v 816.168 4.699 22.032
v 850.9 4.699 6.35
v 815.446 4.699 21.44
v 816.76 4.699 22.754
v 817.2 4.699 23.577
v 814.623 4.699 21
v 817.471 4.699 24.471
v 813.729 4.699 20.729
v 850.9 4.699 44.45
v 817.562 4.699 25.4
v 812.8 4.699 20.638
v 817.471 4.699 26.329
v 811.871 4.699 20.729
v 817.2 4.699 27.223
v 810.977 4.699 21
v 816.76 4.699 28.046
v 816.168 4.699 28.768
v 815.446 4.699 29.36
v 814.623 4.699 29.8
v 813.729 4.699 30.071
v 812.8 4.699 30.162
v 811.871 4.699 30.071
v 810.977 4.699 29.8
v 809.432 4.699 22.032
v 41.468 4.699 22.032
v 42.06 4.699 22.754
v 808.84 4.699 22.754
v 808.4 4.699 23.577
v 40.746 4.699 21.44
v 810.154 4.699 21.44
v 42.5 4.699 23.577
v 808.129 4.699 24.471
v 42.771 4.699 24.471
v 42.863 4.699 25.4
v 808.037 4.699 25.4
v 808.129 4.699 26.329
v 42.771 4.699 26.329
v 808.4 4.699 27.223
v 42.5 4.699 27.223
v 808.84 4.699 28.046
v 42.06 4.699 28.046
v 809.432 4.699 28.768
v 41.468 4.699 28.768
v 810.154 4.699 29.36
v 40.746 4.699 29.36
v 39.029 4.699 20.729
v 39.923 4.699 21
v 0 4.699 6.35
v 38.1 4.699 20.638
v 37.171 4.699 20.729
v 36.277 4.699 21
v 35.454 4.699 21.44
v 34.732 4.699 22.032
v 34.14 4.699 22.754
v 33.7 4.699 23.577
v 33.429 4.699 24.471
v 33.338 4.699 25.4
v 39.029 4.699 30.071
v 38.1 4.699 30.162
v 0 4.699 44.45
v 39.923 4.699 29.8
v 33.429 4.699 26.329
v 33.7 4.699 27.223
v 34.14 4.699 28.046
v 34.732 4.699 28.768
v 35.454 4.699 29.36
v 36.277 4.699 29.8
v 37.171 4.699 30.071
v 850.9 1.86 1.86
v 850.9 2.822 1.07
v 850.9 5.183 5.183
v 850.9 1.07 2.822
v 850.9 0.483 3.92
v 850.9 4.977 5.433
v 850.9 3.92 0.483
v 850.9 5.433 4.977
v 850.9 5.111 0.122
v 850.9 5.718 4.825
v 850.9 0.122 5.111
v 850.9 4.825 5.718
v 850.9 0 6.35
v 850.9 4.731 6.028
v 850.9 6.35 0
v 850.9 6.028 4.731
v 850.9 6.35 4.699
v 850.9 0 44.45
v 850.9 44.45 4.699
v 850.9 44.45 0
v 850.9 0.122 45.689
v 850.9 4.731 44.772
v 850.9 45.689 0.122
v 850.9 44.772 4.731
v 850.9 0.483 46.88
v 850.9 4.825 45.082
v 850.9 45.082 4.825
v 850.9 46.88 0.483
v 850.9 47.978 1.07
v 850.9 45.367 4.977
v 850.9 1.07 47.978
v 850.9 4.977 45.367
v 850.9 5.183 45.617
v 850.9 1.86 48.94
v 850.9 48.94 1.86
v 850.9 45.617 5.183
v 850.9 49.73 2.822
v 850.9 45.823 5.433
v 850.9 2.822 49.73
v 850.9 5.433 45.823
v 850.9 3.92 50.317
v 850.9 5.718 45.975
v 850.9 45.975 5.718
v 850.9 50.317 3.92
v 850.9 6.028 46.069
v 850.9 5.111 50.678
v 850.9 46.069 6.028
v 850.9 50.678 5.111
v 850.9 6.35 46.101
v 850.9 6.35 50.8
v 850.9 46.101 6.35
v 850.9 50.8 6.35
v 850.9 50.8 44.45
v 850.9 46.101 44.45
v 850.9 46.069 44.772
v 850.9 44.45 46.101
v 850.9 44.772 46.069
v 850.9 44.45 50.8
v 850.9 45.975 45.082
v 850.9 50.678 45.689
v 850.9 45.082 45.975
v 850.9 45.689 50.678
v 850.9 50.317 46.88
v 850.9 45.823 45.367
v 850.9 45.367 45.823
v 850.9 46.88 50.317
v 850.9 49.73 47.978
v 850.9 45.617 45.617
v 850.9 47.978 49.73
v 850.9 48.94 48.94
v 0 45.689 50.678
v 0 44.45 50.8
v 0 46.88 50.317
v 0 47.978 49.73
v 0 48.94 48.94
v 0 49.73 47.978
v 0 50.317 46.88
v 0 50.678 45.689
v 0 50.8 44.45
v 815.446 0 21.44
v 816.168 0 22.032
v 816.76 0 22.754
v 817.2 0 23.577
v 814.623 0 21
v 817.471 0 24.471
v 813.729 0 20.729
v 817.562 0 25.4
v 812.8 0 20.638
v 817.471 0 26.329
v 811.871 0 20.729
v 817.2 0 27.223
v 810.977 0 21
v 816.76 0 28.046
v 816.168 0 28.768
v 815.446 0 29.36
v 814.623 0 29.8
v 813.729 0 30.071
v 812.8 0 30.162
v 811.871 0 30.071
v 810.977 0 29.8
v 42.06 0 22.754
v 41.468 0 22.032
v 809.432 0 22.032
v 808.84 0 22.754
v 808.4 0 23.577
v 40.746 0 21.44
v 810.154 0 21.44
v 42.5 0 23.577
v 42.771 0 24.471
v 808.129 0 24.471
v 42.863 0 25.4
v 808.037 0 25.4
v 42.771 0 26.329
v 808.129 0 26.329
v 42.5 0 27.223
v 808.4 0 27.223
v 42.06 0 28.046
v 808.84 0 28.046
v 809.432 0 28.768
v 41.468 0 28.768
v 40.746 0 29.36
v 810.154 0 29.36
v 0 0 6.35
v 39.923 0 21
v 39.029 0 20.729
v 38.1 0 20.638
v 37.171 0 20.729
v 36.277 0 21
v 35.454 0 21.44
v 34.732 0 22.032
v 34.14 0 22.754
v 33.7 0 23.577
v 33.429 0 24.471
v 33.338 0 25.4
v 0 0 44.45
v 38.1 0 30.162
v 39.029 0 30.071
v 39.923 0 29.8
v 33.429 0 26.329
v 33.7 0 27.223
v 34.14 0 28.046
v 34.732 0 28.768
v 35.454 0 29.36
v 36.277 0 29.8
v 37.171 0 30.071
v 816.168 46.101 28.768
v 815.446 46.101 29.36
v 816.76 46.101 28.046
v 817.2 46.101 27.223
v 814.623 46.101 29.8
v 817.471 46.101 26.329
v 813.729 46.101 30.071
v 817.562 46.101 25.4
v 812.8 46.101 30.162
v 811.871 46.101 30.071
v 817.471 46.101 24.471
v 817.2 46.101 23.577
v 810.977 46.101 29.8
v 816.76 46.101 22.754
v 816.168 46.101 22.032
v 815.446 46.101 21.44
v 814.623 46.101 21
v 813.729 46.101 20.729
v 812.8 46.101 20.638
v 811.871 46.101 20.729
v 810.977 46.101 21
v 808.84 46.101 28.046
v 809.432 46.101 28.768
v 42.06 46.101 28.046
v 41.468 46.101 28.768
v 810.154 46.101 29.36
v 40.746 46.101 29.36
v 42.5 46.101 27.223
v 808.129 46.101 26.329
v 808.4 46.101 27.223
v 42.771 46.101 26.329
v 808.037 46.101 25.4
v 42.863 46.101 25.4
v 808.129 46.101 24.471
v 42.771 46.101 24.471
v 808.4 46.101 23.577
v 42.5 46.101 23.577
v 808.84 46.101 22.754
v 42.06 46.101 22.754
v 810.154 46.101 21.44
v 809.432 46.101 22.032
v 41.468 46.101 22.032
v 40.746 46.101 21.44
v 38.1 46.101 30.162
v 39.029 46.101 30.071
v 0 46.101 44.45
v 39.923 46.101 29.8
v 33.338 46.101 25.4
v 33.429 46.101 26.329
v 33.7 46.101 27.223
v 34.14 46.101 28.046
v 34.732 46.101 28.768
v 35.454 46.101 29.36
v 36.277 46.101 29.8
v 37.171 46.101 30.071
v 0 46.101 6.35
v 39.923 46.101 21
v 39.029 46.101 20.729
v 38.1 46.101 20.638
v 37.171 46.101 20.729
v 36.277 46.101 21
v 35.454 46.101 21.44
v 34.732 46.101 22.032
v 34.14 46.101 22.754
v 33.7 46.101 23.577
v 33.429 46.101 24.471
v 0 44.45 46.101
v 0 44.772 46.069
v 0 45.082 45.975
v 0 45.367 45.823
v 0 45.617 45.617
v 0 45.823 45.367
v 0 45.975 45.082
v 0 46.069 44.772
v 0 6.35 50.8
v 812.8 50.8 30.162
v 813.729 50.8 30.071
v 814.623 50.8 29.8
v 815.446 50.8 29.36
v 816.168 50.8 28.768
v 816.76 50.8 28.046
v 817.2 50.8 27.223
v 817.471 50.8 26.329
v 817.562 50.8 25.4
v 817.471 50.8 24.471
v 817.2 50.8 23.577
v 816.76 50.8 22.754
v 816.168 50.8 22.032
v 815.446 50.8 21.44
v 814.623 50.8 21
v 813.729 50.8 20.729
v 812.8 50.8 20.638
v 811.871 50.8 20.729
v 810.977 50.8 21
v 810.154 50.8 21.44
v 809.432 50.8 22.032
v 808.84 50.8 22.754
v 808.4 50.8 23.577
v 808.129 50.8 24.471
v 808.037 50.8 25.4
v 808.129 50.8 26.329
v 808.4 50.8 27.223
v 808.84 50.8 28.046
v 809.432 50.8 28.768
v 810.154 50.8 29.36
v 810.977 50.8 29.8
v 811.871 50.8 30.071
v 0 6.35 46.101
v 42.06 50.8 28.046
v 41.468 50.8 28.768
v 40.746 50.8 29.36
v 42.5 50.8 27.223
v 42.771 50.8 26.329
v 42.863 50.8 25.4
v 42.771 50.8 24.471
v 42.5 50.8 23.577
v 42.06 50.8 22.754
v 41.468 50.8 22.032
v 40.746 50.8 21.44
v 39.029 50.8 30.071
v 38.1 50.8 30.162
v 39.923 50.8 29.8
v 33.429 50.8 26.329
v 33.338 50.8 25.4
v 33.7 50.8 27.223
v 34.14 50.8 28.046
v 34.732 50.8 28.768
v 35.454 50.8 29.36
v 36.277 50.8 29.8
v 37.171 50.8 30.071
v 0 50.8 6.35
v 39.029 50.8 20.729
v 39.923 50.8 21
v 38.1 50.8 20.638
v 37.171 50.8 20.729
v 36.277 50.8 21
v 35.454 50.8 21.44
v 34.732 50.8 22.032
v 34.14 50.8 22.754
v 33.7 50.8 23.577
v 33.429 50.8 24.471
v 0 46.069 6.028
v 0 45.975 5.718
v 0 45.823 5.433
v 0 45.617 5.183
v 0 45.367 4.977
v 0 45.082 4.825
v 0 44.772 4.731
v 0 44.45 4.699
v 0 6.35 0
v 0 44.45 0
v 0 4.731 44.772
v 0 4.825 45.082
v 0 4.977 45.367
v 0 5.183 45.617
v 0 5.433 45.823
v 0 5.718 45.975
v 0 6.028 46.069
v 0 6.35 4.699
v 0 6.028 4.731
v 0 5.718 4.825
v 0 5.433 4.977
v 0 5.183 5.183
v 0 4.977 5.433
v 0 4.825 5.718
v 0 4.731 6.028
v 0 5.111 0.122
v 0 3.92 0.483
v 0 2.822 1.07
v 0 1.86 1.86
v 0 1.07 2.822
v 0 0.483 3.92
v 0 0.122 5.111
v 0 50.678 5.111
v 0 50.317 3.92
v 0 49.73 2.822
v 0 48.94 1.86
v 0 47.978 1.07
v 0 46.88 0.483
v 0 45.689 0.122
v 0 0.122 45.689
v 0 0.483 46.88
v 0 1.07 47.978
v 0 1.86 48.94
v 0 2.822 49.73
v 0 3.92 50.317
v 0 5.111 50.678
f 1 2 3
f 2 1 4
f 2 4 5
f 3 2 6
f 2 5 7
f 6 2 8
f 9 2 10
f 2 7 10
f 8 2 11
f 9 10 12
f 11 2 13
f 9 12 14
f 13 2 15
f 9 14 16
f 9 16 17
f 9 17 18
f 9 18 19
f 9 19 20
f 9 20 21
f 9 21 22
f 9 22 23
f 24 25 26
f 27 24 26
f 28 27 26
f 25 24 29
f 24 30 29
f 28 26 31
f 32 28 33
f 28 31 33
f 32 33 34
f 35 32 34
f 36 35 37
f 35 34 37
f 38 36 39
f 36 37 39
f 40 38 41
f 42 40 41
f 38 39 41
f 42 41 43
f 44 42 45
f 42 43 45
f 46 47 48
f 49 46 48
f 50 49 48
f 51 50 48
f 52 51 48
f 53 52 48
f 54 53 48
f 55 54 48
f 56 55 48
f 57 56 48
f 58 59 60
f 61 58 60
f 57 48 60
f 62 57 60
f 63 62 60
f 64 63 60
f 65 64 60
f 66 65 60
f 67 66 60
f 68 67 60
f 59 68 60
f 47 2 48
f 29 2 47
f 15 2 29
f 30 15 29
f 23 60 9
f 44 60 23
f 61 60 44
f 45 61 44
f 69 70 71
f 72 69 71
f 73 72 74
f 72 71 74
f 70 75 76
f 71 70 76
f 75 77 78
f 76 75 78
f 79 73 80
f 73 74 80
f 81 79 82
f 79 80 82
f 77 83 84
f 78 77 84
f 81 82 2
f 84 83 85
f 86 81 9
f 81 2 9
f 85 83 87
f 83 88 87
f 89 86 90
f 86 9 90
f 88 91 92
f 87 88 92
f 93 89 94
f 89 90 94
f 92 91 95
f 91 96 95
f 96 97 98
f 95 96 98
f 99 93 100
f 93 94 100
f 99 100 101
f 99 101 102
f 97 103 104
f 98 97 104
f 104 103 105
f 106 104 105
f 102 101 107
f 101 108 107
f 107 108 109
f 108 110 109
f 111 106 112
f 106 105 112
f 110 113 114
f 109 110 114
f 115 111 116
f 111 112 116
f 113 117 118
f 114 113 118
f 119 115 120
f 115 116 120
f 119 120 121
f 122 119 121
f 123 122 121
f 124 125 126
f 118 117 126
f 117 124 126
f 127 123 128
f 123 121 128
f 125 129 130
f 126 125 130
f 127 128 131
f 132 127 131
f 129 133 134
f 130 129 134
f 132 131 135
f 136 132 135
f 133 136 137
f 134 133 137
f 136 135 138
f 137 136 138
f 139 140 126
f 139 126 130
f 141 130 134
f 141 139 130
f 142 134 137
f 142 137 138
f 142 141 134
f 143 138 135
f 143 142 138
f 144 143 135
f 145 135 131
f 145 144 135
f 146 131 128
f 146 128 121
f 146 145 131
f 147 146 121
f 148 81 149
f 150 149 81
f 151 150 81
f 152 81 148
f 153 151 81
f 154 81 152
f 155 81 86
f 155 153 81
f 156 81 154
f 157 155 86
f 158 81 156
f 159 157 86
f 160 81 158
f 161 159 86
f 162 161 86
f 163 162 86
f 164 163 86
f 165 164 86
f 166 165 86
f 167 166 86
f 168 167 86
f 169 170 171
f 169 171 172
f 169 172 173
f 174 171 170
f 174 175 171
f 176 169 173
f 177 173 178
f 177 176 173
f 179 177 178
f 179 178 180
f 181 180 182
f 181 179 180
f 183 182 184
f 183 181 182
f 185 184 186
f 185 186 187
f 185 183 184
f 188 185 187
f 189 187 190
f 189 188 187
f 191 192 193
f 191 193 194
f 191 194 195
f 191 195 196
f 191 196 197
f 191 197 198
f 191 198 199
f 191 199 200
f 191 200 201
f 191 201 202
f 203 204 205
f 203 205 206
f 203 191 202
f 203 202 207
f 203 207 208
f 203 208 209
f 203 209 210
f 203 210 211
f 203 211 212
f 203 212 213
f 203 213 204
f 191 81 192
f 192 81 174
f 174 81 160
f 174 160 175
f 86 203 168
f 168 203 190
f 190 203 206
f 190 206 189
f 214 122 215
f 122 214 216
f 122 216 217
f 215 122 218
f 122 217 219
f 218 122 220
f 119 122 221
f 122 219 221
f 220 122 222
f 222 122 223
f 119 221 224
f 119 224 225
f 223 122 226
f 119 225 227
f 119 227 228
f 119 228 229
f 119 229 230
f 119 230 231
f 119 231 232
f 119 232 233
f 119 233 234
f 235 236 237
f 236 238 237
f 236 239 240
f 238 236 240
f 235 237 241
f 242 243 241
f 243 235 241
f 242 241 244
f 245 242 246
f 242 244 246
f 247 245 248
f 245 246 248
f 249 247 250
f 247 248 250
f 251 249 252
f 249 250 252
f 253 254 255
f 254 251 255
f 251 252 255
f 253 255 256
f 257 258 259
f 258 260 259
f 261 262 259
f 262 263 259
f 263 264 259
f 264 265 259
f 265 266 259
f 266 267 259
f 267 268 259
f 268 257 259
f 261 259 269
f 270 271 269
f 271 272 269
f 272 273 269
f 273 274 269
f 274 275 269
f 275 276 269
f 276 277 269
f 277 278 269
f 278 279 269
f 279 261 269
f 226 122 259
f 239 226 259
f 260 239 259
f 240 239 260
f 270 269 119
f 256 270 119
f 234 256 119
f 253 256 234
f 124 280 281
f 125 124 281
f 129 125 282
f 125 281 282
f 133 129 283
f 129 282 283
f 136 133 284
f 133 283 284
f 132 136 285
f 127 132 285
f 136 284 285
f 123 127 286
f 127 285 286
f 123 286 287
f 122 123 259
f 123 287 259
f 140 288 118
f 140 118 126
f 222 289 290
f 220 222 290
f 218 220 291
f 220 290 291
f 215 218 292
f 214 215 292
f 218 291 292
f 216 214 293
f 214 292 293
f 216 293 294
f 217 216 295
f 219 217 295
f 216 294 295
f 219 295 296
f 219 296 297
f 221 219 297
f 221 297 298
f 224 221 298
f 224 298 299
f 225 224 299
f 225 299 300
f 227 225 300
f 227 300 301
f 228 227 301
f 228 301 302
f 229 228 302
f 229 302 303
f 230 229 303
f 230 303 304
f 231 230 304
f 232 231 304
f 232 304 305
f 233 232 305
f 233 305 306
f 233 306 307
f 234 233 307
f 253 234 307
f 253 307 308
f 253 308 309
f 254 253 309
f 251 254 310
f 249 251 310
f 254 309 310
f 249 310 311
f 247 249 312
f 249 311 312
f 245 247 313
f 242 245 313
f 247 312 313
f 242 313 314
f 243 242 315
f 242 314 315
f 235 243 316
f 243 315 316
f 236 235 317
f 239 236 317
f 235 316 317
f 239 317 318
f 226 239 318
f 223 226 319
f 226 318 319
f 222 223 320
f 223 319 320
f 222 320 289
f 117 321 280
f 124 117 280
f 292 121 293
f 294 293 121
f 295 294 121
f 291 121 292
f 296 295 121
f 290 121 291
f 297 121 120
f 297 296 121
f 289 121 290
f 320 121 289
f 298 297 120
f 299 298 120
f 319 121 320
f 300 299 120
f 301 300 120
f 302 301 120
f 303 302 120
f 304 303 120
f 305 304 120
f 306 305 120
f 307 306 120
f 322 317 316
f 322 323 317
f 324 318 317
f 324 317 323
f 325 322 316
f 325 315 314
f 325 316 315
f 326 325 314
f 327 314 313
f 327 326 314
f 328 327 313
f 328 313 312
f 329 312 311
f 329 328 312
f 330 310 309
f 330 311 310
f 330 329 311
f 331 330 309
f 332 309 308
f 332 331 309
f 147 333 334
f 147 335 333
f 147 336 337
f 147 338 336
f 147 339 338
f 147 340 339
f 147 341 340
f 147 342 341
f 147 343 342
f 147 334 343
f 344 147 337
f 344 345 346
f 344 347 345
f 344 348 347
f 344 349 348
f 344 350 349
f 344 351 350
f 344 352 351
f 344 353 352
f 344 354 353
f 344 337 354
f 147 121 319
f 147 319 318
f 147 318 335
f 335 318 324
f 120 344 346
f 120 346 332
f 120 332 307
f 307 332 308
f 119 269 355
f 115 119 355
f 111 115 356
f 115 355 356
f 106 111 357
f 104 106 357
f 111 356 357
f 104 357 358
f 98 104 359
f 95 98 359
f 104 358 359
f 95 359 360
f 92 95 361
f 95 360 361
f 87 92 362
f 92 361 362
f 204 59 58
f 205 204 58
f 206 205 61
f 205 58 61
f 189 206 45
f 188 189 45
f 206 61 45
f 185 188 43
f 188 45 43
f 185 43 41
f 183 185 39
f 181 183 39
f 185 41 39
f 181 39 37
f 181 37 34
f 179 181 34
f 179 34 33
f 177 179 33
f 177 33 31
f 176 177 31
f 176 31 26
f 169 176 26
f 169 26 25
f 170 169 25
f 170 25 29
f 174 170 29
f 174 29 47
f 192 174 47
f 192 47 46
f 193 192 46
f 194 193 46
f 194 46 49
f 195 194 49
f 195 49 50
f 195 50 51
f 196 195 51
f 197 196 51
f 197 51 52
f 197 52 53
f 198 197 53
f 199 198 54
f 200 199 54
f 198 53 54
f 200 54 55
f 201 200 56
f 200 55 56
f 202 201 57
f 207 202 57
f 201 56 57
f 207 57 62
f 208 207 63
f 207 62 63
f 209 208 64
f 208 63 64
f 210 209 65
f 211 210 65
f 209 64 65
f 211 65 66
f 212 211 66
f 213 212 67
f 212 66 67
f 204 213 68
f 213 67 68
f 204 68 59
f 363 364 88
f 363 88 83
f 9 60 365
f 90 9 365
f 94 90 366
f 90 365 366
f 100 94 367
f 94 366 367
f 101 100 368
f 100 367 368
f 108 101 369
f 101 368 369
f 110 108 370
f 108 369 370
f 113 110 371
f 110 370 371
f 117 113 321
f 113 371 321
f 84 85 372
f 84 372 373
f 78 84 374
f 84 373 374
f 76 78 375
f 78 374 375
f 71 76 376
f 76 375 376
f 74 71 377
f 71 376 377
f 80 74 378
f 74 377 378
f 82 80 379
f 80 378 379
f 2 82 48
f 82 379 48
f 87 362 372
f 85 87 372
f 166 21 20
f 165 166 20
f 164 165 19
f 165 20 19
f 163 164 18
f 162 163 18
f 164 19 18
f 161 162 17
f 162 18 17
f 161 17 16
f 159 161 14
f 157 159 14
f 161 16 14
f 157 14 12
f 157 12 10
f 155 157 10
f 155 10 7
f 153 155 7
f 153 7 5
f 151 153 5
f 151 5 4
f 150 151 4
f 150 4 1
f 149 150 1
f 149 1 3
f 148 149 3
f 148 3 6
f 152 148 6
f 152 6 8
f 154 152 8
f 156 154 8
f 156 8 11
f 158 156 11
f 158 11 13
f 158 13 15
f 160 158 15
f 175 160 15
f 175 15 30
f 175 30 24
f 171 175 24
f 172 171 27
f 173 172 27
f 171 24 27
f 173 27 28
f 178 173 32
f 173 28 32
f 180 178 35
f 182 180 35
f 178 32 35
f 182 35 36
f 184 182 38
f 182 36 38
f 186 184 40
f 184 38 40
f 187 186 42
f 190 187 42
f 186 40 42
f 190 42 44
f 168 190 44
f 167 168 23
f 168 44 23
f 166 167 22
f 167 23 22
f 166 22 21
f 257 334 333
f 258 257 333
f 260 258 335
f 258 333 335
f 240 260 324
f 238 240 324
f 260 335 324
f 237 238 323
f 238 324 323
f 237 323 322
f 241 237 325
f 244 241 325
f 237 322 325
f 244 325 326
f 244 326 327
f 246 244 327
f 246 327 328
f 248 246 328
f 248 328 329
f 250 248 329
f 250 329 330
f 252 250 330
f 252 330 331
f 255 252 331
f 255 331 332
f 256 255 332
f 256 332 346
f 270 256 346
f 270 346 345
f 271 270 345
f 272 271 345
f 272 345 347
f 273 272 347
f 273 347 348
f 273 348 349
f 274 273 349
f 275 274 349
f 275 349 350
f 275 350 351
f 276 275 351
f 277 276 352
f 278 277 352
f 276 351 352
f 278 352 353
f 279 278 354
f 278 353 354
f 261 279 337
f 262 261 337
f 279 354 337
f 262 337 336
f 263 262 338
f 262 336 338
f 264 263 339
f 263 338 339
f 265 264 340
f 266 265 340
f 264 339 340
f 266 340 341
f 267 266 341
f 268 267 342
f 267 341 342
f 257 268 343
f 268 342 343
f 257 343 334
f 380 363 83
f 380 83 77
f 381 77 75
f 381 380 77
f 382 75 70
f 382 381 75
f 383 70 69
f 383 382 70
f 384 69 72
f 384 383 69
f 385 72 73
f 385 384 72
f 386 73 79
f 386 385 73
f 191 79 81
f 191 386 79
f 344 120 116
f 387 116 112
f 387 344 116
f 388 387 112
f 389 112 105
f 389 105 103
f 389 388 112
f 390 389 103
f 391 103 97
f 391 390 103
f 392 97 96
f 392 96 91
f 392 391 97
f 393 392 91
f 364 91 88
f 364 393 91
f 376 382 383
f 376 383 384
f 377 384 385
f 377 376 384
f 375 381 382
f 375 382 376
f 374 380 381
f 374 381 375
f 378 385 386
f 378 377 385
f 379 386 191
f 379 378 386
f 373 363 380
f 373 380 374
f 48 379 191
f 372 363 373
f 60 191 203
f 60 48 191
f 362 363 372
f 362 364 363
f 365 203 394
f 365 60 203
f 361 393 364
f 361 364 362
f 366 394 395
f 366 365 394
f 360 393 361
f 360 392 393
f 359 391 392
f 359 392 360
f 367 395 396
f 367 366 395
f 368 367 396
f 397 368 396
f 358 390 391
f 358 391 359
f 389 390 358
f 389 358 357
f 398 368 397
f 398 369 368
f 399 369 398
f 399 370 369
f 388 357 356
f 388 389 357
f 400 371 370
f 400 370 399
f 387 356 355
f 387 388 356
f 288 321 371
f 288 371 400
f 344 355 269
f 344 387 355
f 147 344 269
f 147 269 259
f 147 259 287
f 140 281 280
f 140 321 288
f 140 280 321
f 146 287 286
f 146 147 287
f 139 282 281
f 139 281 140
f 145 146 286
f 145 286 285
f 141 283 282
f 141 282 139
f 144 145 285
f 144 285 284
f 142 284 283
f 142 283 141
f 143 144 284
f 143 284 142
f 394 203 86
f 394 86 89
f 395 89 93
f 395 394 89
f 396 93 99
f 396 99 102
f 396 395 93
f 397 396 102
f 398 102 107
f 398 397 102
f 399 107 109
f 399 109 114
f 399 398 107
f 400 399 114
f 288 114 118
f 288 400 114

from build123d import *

# Parameters (mm, degrees)
BOSS_EXTRUDE1_DEPTH = 850.9
SKETCH2_R           = 4.7625
CUT_EXTRUDE1_DEPTH  = 850.9


with BuildPart() as part:
    # Sketch1 → Boss-Extrude1 (new body)
    with BuildSketch(Plane(origin=(0, 0, 0), x_dir=(0, 0, -1), z_dir=(1, 0, 0))):
        with BuildLine():
            Line((-6.35, 0), (-44.45, 0))
            ThreePointArc((-44.45, 0), (-48.940128061, 1.859871939), (-50.8, 6.35))
            Line((-50.8, 6.35), (-50.8, 44.45))
            ThreePointArc((-50.8, 44.45), (-48.940128061, 48.940128061), (-44.45, 50.8))
            Line((-44.45, 50.8), (-6.35, 50.8))
            ThreePointArc((-6.35, 50.8), (-1.859871939, 48.940128061), (0, 44.45))
            Line((0, 44.45), (0, 6.35))
            ThreePointArc((0, 6.35), (-1.859871939, 1.859871939), (-6.35, 0))
        make_face()
        with BuildLine():
            Line((-6.35, 4.699), (-44.45, 4.699))
            ThreePointArc((-44.45, 4.699), (-45.617433296, 5.182566704), (-46.101, 6.35))
            Line((-46.101, 6.35), (-46.101, 44.45))
            ThreePointArc((-46.101, 44.45), (-45.617433296, 45.617433296), (-44.45, 46.101))
            Line((-44.45, 46.101), (-6.35, 46.101))
            ThreePointArc((-6.35, 46.101), (-5.182566704, 45.617433296), (-4.699, 44.45))
            Line((-4.699, 44.45), (-4.699, 6.35))
            ThreePointArc((-4.699, 6.35), (-5.182566704, 5.182566704), (-6.35, 4.699))
        make_face(mode=Mode.SUBTRACT)
    extrude(amount=BOSS_EXTRUDE1_DEPTH)

    # Sketch2 → Cut-Extrude1 (cut)
    with BuildSketch(Plane(origin=(0, 50.8, 0), x_dir=(1, 0, 0), z_dir=(0, 1, 0))):
        with Locations((38.1, -25.4)):
            Circle(SKETCH2_R)
        with Locations((812.8, -25.4)):
            Circle(SKETCH2_R)
    extrude(amount=-CUT_EXTRUDE1_DEPTH, mode=Mode.SUBTRACT)


solid = part.part
